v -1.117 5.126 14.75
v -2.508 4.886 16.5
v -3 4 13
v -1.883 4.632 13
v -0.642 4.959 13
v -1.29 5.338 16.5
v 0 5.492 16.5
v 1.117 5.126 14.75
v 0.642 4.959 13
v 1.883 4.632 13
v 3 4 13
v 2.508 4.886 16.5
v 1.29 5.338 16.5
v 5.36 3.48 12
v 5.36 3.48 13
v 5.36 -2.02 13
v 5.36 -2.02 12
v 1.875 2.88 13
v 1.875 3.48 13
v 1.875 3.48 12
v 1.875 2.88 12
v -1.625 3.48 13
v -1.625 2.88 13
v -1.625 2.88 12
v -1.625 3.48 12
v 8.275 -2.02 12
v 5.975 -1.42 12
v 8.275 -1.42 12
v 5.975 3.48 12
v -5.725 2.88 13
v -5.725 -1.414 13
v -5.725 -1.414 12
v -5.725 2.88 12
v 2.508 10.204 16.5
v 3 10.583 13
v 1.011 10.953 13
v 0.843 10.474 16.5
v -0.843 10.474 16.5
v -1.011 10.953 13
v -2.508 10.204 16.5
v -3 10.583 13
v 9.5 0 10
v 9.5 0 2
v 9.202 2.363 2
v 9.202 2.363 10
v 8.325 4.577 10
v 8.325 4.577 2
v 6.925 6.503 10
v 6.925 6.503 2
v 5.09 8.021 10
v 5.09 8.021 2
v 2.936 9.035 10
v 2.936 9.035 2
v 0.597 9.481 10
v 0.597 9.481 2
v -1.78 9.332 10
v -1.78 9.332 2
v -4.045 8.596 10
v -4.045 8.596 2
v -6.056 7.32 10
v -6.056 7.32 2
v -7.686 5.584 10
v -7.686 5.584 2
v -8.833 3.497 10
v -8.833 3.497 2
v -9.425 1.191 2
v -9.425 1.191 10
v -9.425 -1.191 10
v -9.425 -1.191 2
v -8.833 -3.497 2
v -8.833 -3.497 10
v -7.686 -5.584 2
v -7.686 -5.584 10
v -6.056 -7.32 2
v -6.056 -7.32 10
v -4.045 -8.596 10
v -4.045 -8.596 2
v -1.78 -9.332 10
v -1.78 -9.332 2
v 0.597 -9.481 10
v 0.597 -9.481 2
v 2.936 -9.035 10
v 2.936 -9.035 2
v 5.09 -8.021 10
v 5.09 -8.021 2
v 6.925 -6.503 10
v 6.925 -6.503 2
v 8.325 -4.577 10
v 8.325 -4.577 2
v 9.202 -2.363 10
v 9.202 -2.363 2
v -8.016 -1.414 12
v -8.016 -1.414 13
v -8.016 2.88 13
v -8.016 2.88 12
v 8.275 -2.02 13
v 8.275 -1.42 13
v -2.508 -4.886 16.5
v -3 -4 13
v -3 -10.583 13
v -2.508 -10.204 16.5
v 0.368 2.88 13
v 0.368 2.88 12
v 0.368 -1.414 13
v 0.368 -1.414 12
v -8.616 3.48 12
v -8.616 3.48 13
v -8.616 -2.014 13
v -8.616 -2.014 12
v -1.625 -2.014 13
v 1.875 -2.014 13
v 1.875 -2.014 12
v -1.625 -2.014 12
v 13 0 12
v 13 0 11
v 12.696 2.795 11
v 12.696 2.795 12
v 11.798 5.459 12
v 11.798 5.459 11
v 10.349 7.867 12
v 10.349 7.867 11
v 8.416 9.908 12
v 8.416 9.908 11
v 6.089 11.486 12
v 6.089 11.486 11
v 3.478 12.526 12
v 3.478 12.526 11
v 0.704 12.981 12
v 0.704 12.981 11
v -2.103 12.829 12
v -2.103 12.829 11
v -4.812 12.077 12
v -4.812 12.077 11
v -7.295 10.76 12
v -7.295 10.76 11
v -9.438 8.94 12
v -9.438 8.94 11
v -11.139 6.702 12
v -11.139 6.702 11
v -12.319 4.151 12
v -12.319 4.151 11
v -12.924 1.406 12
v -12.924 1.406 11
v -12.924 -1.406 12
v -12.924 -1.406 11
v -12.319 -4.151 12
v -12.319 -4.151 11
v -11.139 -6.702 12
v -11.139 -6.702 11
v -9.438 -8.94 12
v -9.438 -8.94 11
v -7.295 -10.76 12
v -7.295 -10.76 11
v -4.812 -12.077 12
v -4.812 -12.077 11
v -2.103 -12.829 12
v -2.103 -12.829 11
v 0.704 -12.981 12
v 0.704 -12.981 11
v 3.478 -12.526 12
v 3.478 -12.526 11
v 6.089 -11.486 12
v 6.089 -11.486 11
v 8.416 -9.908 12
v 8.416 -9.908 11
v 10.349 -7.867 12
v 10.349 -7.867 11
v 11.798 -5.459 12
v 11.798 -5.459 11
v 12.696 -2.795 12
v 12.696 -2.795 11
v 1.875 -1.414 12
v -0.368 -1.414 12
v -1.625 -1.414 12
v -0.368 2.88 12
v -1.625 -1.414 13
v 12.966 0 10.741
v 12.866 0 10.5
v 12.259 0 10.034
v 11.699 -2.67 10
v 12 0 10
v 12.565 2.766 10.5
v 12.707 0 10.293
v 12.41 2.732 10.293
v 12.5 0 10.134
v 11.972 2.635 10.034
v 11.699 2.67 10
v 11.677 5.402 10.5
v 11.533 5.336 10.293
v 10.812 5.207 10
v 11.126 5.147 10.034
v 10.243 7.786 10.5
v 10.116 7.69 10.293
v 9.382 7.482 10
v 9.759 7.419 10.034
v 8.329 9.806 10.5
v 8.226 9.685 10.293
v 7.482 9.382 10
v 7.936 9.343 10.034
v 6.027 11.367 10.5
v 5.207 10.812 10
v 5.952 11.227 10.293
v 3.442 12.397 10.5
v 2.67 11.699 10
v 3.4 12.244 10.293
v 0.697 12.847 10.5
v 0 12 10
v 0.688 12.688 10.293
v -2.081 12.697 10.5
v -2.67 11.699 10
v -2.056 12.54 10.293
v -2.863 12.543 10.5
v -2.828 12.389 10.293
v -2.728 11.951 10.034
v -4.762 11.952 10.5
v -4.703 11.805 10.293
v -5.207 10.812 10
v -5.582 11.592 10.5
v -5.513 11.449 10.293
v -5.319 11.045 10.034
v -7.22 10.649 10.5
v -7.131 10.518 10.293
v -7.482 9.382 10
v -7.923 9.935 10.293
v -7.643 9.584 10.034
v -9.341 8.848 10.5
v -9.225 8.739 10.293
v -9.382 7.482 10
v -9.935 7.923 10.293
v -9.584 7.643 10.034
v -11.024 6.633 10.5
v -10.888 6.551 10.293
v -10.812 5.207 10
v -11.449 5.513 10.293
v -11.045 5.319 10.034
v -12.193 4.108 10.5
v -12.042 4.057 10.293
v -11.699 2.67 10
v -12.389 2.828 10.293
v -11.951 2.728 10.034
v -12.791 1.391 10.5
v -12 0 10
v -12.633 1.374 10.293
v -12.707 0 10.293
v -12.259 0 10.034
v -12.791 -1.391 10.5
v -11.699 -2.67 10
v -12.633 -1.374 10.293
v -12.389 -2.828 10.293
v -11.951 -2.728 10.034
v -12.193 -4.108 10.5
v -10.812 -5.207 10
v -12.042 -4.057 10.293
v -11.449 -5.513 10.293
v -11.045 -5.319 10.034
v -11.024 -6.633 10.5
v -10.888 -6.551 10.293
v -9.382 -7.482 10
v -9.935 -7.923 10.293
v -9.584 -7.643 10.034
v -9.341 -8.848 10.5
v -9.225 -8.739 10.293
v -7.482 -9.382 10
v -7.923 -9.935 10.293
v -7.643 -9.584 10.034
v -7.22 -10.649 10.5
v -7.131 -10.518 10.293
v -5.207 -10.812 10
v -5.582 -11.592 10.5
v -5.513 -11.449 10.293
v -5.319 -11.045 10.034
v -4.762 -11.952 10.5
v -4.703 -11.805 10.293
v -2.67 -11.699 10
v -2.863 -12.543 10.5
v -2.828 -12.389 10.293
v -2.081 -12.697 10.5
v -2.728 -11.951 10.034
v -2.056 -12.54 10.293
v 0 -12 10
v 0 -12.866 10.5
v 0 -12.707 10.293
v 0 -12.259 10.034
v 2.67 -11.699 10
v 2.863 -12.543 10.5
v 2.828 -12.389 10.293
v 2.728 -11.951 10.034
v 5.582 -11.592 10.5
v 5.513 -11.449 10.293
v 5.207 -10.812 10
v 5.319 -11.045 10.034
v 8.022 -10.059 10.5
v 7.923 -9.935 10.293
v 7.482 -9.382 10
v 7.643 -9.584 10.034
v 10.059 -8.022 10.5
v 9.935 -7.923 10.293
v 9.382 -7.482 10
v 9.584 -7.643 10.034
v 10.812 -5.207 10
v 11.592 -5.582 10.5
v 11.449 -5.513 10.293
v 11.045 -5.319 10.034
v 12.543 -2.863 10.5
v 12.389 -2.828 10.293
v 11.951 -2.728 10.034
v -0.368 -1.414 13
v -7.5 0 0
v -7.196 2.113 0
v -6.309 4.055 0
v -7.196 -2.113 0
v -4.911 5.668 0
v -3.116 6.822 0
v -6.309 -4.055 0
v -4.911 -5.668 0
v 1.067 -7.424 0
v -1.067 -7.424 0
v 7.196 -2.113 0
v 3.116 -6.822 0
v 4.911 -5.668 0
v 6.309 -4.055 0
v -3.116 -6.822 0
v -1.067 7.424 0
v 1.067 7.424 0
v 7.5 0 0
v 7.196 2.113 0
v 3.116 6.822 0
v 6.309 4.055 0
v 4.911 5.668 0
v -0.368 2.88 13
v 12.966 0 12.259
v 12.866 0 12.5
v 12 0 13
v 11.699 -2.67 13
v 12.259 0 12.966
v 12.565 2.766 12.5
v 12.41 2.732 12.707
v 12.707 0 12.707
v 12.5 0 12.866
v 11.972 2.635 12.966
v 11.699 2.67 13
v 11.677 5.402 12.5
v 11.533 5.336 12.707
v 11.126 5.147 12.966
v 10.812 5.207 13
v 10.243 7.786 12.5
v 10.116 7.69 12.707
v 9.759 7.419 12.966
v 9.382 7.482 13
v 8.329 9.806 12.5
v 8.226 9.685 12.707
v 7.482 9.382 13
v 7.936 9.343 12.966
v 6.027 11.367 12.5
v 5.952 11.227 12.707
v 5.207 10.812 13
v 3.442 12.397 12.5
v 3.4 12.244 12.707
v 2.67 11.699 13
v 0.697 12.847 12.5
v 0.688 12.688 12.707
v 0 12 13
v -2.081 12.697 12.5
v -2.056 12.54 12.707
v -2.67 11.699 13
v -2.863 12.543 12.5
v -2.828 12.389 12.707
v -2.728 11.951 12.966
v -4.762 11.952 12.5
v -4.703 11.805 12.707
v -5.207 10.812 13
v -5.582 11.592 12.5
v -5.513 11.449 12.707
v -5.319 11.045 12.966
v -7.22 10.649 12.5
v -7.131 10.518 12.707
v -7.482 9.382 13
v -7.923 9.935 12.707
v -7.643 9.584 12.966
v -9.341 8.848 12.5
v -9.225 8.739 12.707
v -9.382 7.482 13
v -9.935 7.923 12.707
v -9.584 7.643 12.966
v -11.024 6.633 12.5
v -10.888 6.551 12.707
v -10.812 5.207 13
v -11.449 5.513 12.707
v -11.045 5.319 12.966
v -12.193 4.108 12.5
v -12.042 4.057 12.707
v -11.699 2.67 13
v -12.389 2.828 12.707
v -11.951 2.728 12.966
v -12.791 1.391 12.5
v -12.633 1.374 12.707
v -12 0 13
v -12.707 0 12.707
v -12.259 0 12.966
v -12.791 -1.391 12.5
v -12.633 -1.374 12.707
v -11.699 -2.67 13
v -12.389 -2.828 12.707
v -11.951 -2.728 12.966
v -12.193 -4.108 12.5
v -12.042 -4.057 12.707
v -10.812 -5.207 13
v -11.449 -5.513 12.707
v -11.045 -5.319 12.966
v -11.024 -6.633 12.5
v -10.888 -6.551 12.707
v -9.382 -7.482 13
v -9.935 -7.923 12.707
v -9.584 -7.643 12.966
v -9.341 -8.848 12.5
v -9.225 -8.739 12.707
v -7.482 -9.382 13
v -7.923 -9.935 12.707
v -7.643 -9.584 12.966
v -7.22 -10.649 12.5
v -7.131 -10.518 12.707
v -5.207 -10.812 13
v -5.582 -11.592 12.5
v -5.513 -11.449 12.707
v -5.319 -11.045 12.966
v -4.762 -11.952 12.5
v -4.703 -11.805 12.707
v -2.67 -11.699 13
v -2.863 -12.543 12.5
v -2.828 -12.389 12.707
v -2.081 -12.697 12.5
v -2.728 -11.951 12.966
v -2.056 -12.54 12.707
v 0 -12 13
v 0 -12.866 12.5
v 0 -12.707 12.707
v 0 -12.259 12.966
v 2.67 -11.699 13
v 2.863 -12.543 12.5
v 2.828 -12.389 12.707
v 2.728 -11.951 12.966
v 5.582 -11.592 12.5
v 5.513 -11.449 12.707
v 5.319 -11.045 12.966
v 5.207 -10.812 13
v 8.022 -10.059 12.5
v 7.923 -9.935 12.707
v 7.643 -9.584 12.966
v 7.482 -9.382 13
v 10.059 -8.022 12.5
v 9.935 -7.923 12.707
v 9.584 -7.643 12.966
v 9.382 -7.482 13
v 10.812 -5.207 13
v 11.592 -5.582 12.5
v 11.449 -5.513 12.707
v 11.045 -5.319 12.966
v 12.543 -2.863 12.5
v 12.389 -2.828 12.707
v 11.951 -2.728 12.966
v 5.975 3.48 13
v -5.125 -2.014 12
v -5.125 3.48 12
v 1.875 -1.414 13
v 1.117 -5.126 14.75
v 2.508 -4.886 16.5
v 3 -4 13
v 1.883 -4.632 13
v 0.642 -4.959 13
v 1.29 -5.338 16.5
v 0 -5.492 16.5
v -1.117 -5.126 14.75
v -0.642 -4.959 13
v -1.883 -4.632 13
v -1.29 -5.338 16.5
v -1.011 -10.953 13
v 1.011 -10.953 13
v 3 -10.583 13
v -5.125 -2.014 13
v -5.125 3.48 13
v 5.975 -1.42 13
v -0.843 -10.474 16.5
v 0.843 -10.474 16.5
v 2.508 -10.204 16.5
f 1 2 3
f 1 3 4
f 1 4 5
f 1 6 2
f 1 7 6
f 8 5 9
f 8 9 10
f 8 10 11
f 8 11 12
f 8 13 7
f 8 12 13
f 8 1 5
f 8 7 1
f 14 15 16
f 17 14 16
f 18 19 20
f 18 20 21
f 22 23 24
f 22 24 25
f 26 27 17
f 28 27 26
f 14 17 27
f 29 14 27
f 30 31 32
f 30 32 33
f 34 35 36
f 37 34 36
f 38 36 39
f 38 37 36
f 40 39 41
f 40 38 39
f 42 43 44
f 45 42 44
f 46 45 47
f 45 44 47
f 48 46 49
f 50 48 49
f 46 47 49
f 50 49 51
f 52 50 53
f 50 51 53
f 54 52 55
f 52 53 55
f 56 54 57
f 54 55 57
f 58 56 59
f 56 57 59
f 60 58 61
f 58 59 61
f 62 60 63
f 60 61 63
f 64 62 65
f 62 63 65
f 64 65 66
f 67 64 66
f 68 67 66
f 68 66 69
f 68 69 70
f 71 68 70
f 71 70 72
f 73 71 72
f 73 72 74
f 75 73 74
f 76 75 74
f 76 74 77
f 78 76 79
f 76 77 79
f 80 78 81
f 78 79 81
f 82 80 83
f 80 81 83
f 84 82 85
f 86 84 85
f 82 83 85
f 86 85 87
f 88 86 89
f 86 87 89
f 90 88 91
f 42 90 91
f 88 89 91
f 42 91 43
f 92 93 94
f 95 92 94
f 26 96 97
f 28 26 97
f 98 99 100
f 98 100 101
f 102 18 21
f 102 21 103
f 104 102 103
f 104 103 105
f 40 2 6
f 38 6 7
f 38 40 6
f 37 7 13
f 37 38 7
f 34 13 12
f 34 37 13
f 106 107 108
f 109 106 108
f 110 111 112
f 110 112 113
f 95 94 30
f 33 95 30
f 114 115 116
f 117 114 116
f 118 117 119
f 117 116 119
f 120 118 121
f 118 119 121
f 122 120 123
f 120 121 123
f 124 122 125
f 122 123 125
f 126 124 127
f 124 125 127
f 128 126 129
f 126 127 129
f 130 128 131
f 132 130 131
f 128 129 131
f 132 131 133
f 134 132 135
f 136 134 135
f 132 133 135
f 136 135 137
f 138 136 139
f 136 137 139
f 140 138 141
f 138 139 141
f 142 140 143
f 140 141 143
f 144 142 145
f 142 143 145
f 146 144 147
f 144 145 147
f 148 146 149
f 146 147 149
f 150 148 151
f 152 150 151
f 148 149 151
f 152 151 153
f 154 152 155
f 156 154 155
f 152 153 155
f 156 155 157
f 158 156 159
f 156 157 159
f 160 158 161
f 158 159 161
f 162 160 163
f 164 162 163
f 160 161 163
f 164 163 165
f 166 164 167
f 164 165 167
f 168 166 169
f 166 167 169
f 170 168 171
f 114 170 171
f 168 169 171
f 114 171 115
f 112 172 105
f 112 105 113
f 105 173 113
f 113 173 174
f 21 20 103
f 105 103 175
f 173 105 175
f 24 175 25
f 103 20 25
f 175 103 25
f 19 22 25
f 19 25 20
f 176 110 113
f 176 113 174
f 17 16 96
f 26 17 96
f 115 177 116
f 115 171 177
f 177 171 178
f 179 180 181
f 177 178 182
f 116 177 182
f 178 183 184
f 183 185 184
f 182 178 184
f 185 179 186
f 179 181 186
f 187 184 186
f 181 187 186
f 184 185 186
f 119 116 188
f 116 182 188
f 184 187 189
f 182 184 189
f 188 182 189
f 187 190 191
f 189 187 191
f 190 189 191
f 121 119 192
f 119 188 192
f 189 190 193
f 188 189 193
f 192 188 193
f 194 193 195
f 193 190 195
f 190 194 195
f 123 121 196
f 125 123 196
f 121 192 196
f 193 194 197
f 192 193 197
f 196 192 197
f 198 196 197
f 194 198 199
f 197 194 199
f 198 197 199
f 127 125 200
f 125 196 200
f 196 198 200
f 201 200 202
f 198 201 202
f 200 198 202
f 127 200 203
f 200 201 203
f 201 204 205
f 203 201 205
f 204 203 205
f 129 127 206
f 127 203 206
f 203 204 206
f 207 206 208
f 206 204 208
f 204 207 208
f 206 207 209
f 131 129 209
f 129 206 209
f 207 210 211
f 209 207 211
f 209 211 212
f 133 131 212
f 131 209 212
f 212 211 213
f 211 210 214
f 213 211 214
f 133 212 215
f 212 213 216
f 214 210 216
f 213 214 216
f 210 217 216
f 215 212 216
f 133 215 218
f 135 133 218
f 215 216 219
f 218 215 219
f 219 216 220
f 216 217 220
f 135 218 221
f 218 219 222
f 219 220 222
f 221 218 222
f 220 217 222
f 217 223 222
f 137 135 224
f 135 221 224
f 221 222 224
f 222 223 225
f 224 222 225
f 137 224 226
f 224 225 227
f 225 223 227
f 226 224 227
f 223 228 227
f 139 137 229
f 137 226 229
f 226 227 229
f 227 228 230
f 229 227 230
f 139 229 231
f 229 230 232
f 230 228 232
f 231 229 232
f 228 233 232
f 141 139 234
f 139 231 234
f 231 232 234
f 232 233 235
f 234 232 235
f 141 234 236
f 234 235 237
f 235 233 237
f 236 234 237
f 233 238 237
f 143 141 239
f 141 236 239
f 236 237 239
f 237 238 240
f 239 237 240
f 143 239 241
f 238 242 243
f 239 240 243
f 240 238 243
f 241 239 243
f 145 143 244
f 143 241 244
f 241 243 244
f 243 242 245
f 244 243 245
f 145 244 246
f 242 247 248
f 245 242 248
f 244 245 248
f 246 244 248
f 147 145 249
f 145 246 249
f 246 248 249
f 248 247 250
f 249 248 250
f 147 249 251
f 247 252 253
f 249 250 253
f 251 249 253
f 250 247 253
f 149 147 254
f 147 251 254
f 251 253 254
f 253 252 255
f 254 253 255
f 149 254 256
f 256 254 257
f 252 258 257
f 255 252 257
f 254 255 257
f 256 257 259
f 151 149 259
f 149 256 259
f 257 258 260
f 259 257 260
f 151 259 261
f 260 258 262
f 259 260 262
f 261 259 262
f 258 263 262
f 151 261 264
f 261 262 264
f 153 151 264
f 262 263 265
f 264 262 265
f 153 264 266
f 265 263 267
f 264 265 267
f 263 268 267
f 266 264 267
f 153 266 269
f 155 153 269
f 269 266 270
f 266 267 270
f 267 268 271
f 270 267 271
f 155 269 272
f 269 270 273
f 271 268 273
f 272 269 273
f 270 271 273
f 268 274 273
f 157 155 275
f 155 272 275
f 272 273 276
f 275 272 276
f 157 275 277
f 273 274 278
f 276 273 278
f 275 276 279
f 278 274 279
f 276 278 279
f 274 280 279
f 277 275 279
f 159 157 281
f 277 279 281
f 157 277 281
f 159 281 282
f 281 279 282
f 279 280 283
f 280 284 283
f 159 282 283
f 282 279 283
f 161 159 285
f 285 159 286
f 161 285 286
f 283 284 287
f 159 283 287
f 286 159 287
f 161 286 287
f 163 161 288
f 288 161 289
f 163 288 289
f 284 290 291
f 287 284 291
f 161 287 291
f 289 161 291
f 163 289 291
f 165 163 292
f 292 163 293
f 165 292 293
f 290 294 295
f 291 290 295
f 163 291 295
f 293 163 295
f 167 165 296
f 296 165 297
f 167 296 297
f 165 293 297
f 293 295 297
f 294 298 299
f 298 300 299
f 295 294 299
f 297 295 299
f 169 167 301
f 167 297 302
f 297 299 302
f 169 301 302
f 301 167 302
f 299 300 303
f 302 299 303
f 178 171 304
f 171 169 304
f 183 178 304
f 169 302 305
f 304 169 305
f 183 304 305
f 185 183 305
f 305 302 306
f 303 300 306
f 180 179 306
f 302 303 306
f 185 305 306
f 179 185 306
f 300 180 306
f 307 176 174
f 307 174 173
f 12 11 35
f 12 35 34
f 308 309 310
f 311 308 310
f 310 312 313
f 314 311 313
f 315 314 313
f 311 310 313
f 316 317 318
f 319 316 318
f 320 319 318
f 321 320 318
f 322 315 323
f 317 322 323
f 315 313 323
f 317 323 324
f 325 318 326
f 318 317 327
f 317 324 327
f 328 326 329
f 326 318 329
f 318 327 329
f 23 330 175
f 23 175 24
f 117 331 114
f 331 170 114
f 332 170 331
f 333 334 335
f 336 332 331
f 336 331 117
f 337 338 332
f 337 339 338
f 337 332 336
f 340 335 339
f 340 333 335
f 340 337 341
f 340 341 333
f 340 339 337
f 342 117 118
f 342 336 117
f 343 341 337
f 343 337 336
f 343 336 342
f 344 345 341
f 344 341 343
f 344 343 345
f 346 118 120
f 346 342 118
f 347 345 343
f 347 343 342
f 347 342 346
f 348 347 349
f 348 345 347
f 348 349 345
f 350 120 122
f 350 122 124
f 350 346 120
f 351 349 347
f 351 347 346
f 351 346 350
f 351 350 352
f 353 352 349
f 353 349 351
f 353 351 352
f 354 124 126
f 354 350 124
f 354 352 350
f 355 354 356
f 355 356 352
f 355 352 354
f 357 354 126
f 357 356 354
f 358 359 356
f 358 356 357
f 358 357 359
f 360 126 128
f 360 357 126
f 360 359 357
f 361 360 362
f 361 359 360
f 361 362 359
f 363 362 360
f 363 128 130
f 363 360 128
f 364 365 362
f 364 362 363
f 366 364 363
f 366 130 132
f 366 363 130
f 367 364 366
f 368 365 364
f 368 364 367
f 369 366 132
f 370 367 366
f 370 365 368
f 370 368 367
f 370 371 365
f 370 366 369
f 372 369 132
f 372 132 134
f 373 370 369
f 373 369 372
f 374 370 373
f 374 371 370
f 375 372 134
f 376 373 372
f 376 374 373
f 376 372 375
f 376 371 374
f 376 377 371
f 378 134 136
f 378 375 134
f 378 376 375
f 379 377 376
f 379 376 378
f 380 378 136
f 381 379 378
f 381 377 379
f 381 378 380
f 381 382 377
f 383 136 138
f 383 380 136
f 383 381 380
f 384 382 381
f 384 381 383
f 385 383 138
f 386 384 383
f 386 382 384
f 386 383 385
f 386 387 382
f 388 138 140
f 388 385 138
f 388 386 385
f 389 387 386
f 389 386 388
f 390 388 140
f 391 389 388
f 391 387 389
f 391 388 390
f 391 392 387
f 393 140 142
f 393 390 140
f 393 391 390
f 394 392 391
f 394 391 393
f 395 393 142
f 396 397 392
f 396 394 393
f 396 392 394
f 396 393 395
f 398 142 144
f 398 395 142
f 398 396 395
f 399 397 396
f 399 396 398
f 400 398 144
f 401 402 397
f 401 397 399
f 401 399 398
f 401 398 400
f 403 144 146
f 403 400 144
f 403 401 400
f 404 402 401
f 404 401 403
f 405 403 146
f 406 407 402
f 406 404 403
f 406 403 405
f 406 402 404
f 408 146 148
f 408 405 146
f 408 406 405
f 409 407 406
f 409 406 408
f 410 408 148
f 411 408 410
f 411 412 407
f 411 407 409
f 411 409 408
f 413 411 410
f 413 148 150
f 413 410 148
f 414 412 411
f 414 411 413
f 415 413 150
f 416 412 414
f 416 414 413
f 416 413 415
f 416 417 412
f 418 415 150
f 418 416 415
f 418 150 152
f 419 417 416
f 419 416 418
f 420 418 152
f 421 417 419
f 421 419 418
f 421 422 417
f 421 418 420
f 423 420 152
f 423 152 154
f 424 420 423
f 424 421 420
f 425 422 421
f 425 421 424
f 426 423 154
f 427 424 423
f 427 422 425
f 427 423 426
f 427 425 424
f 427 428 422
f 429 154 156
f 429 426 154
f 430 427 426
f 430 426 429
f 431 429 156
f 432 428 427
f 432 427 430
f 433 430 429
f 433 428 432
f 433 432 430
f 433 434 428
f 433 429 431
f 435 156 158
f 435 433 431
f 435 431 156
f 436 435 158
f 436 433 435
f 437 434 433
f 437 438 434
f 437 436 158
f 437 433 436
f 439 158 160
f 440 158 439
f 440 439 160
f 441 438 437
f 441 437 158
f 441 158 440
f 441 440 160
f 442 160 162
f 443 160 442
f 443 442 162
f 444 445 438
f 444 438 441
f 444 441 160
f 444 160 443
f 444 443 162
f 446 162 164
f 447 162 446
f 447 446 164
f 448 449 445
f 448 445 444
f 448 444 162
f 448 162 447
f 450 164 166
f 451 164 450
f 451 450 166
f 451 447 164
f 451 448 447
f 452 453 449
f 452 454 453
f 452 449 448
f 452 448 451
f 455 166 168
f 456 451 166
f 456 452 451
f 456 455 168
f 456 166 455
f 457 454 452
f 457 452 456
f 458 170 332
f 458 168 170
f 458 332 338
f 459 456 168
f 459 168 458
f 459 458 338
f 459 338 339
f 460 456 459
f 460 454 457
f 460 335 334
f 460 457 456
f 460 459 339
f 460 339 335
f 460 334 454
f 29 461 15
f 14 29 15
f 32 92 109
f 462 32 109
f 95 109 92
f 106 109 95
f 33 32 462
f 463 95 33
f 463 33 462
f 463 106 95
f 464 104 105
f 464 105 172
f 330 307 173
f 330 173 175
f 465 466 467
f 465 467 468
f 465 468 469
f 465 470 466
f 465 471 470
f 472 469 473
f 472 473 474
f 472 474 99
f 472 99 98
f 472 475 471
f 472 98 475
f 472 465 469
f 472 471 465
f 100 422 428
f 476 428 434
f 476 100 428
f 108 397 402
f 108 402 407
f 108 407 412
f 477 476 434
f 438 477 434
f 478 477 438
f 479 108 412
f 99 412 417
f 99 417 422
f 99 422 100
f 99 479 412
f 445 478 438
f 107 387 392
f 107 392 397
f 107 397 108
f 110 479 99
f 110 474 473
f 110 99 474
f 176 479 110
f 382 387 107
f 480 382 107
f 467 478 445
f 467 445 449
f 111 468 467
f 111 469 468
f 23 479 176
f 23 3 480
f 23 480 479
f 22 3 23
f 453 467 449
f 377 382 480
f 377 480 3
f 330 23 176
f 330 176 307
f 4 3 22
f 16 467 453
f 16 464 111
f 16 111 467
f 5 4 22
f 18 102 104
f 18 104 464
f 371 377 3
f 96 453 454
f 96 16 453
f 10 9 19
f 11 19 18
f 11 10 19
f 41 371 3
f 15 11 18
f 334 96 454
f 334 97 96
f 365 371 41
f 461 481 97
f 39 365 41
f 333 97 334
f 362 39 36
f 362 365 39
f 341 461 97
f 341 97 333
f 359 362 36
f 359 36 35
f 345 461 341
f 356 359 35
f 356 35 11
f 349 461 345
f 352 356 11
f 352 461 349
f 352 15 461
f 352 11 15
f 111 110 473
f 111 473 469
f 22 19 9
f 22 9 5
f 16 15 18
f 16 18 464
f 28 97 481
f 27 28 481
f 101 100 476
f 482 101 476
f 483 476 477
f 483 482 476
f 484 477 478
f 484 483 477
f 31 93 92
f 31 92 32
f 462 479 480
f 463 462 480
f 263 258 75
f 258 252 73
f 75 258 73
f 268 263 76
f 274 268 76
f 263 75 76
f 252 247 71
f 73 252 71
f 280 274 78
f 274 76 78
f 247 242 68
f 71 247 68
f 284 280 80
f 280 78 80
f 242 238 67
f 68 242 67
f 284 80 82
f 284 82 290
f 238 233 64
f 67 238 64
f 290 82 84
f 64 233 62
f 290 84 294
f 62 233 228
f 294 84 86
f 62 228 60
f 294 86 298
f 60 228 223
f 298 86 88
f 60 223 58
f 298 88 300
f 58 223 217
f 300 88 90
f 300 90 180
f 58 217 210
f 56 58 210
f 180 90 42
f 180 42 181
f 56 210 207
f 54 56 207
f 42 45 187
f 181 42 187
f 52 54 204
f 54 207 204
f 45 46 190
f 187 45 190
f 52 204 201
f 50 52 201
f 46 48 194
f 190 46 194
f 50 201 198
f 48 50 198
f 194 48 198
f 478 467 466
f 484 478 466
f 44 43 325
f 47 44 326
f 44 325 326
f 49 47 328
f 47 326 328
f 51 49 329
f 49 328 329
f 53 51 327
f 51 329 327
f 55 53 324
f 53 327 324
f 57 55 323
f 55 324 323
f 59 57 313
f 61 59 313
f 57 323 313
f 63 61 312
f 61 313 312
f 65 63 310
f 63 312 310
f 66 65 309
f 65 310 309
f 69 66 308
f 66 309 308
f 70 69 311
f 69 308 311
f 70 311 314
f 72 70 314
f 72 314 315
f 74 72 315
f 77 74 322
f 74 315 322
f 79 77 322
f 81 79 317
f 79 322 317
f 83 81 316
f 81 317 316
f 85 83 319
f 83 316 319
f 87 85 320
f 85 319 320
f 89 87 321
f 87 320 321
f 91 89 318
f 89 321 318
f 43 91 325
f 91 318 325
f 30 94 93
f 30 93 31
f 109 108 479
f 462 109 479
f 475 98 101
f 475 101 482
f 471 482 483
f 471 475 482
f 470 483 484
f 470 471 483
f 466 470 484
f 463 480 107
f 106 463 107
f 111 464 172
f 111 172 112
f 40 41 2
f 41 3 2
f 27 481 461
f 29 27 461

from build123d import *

# Parameters (mm, degrees)
SKETCH1_R           = 9.5
BOSS_EXTRUDE1_DEPTH = 10
CHAMFER1_SIZE       = 2
SKETCH2_R           = 13
BOSS_EXTRUDE2_DEPTH = 3
BOSS_EXTRUDE3_DEPTH = 3.5
BOSS_EXTRUDE3_TAPER = 8
FILLET1_R           = 1
SKETCH3_W           = 2.290416552
SKETCH3_H           = 4.294163917
CUT_EXTRUDE1_DEPTH  = 1


with BuildPart() as part:
    # Sketch1 → Boss-Extrude1 (new body)
    with BuildSketch(Plane.XY):
        Circle(SKETCH1_R)
    extrude(amount=BOSS_EXTRUDE1_DEPTH)

    # Chamfer1
    chamfer1_edges = [part.edges().sort_by_distance(p)[0] for p in [
        (-9.5, 0, 0),
    ]]
    chamfer(chamfer1_edges, length=CHAMFER1_SIZE)

    # Sketch2 → Boss-Extrude2 (add)
    with BuildSketch(Plane.XY.offset(10)):
        Circle(SKETCH2_R)
    extrude(amount=BOSS_EXTRUDE2_DEPTH)

    # Sketch4 → Boss-Extrude3 (add)
    with BuildSketch(Plane.XY.offset(13)):
        with BuildLine():
            ThreePointArc((3, 10.583005244), (0, 11), (-3, 10.583005244))
            Line((-3, 10.583005244), (-3, 4))
            ThreePointArc((-3, 4), (0, 5), (3, 4))
            Line((3, 4), (3, 10.583005244))
        make_face()
        with BuildLine():
            ThreePointArc((3, -4), (0, -5), (-3, -4))
            Line((-3, -4), (-3, -10.583005244))
            ThreePointArc((-3, -10.583005244), (0, -11), (3, -10.583005244))
            Line((3, -10.583005244), (3, -4))
        make_face()
    extrude(amount=BOSS_EXTRUDE3_DEPTH, taper=BOSS_EXTRUDE3_TAPER)

    # Fillet1
    fillet1_edges = [part.edges().sort_by_distance(p)[0] for p in [
        (-13, 0, 10),
        (-13, 0, 13),
    ]]
    fillet(fillet1_edges, radius=FILLET1_R)

    # Sketch3 → Cut-Extrude1 (cut)
    with BuildSketch(Plane.XY.offset(13)):
        Polygon((-1.625120105, -2.013905208), (-1.625120105, -1.413905208), (-0.367640206, -1.413905208), (-0.367640206, 2.880258709), (-1.625120105, 2.880258709), (-1.625120105, 3.480258709), (1.874879895, 3.480258709), (1.874879895, 2.880258709), (0.367640206, 2.880258709), (0.367640206, -1.413905208), (1.874879895, -1.413905208), (1.874879895, -2.013905208), align=None)
        Polygon((5.359789492, 3.480258709), (5.359789492, -1.419741291), (5.359789492, -2.019741291), (8.274879895, -2.019741291), (8.274879895, -1.419741291), (5.974879895, -1.419741291), (5.974879895, 3.480258709), align=None)
        Polygon((-8.615536657, 3.480258709), (-8.615536657, -2.013905208), (-5.125120105, -2.013905208), (-5.125120105, 2.880258709), (-5.125120105, 3.480258709), align=None)
        with Locations((-6.870328381, 0.73317675)):
            Rectangle(SKETCH3_W, SKETCH3_H, mode=Mode.SUBTRACT)
    extrude(amount=-CUT_EXTRUDE1_DEPTH, mode=Mode.SUBTRACT)


solid = part.part
